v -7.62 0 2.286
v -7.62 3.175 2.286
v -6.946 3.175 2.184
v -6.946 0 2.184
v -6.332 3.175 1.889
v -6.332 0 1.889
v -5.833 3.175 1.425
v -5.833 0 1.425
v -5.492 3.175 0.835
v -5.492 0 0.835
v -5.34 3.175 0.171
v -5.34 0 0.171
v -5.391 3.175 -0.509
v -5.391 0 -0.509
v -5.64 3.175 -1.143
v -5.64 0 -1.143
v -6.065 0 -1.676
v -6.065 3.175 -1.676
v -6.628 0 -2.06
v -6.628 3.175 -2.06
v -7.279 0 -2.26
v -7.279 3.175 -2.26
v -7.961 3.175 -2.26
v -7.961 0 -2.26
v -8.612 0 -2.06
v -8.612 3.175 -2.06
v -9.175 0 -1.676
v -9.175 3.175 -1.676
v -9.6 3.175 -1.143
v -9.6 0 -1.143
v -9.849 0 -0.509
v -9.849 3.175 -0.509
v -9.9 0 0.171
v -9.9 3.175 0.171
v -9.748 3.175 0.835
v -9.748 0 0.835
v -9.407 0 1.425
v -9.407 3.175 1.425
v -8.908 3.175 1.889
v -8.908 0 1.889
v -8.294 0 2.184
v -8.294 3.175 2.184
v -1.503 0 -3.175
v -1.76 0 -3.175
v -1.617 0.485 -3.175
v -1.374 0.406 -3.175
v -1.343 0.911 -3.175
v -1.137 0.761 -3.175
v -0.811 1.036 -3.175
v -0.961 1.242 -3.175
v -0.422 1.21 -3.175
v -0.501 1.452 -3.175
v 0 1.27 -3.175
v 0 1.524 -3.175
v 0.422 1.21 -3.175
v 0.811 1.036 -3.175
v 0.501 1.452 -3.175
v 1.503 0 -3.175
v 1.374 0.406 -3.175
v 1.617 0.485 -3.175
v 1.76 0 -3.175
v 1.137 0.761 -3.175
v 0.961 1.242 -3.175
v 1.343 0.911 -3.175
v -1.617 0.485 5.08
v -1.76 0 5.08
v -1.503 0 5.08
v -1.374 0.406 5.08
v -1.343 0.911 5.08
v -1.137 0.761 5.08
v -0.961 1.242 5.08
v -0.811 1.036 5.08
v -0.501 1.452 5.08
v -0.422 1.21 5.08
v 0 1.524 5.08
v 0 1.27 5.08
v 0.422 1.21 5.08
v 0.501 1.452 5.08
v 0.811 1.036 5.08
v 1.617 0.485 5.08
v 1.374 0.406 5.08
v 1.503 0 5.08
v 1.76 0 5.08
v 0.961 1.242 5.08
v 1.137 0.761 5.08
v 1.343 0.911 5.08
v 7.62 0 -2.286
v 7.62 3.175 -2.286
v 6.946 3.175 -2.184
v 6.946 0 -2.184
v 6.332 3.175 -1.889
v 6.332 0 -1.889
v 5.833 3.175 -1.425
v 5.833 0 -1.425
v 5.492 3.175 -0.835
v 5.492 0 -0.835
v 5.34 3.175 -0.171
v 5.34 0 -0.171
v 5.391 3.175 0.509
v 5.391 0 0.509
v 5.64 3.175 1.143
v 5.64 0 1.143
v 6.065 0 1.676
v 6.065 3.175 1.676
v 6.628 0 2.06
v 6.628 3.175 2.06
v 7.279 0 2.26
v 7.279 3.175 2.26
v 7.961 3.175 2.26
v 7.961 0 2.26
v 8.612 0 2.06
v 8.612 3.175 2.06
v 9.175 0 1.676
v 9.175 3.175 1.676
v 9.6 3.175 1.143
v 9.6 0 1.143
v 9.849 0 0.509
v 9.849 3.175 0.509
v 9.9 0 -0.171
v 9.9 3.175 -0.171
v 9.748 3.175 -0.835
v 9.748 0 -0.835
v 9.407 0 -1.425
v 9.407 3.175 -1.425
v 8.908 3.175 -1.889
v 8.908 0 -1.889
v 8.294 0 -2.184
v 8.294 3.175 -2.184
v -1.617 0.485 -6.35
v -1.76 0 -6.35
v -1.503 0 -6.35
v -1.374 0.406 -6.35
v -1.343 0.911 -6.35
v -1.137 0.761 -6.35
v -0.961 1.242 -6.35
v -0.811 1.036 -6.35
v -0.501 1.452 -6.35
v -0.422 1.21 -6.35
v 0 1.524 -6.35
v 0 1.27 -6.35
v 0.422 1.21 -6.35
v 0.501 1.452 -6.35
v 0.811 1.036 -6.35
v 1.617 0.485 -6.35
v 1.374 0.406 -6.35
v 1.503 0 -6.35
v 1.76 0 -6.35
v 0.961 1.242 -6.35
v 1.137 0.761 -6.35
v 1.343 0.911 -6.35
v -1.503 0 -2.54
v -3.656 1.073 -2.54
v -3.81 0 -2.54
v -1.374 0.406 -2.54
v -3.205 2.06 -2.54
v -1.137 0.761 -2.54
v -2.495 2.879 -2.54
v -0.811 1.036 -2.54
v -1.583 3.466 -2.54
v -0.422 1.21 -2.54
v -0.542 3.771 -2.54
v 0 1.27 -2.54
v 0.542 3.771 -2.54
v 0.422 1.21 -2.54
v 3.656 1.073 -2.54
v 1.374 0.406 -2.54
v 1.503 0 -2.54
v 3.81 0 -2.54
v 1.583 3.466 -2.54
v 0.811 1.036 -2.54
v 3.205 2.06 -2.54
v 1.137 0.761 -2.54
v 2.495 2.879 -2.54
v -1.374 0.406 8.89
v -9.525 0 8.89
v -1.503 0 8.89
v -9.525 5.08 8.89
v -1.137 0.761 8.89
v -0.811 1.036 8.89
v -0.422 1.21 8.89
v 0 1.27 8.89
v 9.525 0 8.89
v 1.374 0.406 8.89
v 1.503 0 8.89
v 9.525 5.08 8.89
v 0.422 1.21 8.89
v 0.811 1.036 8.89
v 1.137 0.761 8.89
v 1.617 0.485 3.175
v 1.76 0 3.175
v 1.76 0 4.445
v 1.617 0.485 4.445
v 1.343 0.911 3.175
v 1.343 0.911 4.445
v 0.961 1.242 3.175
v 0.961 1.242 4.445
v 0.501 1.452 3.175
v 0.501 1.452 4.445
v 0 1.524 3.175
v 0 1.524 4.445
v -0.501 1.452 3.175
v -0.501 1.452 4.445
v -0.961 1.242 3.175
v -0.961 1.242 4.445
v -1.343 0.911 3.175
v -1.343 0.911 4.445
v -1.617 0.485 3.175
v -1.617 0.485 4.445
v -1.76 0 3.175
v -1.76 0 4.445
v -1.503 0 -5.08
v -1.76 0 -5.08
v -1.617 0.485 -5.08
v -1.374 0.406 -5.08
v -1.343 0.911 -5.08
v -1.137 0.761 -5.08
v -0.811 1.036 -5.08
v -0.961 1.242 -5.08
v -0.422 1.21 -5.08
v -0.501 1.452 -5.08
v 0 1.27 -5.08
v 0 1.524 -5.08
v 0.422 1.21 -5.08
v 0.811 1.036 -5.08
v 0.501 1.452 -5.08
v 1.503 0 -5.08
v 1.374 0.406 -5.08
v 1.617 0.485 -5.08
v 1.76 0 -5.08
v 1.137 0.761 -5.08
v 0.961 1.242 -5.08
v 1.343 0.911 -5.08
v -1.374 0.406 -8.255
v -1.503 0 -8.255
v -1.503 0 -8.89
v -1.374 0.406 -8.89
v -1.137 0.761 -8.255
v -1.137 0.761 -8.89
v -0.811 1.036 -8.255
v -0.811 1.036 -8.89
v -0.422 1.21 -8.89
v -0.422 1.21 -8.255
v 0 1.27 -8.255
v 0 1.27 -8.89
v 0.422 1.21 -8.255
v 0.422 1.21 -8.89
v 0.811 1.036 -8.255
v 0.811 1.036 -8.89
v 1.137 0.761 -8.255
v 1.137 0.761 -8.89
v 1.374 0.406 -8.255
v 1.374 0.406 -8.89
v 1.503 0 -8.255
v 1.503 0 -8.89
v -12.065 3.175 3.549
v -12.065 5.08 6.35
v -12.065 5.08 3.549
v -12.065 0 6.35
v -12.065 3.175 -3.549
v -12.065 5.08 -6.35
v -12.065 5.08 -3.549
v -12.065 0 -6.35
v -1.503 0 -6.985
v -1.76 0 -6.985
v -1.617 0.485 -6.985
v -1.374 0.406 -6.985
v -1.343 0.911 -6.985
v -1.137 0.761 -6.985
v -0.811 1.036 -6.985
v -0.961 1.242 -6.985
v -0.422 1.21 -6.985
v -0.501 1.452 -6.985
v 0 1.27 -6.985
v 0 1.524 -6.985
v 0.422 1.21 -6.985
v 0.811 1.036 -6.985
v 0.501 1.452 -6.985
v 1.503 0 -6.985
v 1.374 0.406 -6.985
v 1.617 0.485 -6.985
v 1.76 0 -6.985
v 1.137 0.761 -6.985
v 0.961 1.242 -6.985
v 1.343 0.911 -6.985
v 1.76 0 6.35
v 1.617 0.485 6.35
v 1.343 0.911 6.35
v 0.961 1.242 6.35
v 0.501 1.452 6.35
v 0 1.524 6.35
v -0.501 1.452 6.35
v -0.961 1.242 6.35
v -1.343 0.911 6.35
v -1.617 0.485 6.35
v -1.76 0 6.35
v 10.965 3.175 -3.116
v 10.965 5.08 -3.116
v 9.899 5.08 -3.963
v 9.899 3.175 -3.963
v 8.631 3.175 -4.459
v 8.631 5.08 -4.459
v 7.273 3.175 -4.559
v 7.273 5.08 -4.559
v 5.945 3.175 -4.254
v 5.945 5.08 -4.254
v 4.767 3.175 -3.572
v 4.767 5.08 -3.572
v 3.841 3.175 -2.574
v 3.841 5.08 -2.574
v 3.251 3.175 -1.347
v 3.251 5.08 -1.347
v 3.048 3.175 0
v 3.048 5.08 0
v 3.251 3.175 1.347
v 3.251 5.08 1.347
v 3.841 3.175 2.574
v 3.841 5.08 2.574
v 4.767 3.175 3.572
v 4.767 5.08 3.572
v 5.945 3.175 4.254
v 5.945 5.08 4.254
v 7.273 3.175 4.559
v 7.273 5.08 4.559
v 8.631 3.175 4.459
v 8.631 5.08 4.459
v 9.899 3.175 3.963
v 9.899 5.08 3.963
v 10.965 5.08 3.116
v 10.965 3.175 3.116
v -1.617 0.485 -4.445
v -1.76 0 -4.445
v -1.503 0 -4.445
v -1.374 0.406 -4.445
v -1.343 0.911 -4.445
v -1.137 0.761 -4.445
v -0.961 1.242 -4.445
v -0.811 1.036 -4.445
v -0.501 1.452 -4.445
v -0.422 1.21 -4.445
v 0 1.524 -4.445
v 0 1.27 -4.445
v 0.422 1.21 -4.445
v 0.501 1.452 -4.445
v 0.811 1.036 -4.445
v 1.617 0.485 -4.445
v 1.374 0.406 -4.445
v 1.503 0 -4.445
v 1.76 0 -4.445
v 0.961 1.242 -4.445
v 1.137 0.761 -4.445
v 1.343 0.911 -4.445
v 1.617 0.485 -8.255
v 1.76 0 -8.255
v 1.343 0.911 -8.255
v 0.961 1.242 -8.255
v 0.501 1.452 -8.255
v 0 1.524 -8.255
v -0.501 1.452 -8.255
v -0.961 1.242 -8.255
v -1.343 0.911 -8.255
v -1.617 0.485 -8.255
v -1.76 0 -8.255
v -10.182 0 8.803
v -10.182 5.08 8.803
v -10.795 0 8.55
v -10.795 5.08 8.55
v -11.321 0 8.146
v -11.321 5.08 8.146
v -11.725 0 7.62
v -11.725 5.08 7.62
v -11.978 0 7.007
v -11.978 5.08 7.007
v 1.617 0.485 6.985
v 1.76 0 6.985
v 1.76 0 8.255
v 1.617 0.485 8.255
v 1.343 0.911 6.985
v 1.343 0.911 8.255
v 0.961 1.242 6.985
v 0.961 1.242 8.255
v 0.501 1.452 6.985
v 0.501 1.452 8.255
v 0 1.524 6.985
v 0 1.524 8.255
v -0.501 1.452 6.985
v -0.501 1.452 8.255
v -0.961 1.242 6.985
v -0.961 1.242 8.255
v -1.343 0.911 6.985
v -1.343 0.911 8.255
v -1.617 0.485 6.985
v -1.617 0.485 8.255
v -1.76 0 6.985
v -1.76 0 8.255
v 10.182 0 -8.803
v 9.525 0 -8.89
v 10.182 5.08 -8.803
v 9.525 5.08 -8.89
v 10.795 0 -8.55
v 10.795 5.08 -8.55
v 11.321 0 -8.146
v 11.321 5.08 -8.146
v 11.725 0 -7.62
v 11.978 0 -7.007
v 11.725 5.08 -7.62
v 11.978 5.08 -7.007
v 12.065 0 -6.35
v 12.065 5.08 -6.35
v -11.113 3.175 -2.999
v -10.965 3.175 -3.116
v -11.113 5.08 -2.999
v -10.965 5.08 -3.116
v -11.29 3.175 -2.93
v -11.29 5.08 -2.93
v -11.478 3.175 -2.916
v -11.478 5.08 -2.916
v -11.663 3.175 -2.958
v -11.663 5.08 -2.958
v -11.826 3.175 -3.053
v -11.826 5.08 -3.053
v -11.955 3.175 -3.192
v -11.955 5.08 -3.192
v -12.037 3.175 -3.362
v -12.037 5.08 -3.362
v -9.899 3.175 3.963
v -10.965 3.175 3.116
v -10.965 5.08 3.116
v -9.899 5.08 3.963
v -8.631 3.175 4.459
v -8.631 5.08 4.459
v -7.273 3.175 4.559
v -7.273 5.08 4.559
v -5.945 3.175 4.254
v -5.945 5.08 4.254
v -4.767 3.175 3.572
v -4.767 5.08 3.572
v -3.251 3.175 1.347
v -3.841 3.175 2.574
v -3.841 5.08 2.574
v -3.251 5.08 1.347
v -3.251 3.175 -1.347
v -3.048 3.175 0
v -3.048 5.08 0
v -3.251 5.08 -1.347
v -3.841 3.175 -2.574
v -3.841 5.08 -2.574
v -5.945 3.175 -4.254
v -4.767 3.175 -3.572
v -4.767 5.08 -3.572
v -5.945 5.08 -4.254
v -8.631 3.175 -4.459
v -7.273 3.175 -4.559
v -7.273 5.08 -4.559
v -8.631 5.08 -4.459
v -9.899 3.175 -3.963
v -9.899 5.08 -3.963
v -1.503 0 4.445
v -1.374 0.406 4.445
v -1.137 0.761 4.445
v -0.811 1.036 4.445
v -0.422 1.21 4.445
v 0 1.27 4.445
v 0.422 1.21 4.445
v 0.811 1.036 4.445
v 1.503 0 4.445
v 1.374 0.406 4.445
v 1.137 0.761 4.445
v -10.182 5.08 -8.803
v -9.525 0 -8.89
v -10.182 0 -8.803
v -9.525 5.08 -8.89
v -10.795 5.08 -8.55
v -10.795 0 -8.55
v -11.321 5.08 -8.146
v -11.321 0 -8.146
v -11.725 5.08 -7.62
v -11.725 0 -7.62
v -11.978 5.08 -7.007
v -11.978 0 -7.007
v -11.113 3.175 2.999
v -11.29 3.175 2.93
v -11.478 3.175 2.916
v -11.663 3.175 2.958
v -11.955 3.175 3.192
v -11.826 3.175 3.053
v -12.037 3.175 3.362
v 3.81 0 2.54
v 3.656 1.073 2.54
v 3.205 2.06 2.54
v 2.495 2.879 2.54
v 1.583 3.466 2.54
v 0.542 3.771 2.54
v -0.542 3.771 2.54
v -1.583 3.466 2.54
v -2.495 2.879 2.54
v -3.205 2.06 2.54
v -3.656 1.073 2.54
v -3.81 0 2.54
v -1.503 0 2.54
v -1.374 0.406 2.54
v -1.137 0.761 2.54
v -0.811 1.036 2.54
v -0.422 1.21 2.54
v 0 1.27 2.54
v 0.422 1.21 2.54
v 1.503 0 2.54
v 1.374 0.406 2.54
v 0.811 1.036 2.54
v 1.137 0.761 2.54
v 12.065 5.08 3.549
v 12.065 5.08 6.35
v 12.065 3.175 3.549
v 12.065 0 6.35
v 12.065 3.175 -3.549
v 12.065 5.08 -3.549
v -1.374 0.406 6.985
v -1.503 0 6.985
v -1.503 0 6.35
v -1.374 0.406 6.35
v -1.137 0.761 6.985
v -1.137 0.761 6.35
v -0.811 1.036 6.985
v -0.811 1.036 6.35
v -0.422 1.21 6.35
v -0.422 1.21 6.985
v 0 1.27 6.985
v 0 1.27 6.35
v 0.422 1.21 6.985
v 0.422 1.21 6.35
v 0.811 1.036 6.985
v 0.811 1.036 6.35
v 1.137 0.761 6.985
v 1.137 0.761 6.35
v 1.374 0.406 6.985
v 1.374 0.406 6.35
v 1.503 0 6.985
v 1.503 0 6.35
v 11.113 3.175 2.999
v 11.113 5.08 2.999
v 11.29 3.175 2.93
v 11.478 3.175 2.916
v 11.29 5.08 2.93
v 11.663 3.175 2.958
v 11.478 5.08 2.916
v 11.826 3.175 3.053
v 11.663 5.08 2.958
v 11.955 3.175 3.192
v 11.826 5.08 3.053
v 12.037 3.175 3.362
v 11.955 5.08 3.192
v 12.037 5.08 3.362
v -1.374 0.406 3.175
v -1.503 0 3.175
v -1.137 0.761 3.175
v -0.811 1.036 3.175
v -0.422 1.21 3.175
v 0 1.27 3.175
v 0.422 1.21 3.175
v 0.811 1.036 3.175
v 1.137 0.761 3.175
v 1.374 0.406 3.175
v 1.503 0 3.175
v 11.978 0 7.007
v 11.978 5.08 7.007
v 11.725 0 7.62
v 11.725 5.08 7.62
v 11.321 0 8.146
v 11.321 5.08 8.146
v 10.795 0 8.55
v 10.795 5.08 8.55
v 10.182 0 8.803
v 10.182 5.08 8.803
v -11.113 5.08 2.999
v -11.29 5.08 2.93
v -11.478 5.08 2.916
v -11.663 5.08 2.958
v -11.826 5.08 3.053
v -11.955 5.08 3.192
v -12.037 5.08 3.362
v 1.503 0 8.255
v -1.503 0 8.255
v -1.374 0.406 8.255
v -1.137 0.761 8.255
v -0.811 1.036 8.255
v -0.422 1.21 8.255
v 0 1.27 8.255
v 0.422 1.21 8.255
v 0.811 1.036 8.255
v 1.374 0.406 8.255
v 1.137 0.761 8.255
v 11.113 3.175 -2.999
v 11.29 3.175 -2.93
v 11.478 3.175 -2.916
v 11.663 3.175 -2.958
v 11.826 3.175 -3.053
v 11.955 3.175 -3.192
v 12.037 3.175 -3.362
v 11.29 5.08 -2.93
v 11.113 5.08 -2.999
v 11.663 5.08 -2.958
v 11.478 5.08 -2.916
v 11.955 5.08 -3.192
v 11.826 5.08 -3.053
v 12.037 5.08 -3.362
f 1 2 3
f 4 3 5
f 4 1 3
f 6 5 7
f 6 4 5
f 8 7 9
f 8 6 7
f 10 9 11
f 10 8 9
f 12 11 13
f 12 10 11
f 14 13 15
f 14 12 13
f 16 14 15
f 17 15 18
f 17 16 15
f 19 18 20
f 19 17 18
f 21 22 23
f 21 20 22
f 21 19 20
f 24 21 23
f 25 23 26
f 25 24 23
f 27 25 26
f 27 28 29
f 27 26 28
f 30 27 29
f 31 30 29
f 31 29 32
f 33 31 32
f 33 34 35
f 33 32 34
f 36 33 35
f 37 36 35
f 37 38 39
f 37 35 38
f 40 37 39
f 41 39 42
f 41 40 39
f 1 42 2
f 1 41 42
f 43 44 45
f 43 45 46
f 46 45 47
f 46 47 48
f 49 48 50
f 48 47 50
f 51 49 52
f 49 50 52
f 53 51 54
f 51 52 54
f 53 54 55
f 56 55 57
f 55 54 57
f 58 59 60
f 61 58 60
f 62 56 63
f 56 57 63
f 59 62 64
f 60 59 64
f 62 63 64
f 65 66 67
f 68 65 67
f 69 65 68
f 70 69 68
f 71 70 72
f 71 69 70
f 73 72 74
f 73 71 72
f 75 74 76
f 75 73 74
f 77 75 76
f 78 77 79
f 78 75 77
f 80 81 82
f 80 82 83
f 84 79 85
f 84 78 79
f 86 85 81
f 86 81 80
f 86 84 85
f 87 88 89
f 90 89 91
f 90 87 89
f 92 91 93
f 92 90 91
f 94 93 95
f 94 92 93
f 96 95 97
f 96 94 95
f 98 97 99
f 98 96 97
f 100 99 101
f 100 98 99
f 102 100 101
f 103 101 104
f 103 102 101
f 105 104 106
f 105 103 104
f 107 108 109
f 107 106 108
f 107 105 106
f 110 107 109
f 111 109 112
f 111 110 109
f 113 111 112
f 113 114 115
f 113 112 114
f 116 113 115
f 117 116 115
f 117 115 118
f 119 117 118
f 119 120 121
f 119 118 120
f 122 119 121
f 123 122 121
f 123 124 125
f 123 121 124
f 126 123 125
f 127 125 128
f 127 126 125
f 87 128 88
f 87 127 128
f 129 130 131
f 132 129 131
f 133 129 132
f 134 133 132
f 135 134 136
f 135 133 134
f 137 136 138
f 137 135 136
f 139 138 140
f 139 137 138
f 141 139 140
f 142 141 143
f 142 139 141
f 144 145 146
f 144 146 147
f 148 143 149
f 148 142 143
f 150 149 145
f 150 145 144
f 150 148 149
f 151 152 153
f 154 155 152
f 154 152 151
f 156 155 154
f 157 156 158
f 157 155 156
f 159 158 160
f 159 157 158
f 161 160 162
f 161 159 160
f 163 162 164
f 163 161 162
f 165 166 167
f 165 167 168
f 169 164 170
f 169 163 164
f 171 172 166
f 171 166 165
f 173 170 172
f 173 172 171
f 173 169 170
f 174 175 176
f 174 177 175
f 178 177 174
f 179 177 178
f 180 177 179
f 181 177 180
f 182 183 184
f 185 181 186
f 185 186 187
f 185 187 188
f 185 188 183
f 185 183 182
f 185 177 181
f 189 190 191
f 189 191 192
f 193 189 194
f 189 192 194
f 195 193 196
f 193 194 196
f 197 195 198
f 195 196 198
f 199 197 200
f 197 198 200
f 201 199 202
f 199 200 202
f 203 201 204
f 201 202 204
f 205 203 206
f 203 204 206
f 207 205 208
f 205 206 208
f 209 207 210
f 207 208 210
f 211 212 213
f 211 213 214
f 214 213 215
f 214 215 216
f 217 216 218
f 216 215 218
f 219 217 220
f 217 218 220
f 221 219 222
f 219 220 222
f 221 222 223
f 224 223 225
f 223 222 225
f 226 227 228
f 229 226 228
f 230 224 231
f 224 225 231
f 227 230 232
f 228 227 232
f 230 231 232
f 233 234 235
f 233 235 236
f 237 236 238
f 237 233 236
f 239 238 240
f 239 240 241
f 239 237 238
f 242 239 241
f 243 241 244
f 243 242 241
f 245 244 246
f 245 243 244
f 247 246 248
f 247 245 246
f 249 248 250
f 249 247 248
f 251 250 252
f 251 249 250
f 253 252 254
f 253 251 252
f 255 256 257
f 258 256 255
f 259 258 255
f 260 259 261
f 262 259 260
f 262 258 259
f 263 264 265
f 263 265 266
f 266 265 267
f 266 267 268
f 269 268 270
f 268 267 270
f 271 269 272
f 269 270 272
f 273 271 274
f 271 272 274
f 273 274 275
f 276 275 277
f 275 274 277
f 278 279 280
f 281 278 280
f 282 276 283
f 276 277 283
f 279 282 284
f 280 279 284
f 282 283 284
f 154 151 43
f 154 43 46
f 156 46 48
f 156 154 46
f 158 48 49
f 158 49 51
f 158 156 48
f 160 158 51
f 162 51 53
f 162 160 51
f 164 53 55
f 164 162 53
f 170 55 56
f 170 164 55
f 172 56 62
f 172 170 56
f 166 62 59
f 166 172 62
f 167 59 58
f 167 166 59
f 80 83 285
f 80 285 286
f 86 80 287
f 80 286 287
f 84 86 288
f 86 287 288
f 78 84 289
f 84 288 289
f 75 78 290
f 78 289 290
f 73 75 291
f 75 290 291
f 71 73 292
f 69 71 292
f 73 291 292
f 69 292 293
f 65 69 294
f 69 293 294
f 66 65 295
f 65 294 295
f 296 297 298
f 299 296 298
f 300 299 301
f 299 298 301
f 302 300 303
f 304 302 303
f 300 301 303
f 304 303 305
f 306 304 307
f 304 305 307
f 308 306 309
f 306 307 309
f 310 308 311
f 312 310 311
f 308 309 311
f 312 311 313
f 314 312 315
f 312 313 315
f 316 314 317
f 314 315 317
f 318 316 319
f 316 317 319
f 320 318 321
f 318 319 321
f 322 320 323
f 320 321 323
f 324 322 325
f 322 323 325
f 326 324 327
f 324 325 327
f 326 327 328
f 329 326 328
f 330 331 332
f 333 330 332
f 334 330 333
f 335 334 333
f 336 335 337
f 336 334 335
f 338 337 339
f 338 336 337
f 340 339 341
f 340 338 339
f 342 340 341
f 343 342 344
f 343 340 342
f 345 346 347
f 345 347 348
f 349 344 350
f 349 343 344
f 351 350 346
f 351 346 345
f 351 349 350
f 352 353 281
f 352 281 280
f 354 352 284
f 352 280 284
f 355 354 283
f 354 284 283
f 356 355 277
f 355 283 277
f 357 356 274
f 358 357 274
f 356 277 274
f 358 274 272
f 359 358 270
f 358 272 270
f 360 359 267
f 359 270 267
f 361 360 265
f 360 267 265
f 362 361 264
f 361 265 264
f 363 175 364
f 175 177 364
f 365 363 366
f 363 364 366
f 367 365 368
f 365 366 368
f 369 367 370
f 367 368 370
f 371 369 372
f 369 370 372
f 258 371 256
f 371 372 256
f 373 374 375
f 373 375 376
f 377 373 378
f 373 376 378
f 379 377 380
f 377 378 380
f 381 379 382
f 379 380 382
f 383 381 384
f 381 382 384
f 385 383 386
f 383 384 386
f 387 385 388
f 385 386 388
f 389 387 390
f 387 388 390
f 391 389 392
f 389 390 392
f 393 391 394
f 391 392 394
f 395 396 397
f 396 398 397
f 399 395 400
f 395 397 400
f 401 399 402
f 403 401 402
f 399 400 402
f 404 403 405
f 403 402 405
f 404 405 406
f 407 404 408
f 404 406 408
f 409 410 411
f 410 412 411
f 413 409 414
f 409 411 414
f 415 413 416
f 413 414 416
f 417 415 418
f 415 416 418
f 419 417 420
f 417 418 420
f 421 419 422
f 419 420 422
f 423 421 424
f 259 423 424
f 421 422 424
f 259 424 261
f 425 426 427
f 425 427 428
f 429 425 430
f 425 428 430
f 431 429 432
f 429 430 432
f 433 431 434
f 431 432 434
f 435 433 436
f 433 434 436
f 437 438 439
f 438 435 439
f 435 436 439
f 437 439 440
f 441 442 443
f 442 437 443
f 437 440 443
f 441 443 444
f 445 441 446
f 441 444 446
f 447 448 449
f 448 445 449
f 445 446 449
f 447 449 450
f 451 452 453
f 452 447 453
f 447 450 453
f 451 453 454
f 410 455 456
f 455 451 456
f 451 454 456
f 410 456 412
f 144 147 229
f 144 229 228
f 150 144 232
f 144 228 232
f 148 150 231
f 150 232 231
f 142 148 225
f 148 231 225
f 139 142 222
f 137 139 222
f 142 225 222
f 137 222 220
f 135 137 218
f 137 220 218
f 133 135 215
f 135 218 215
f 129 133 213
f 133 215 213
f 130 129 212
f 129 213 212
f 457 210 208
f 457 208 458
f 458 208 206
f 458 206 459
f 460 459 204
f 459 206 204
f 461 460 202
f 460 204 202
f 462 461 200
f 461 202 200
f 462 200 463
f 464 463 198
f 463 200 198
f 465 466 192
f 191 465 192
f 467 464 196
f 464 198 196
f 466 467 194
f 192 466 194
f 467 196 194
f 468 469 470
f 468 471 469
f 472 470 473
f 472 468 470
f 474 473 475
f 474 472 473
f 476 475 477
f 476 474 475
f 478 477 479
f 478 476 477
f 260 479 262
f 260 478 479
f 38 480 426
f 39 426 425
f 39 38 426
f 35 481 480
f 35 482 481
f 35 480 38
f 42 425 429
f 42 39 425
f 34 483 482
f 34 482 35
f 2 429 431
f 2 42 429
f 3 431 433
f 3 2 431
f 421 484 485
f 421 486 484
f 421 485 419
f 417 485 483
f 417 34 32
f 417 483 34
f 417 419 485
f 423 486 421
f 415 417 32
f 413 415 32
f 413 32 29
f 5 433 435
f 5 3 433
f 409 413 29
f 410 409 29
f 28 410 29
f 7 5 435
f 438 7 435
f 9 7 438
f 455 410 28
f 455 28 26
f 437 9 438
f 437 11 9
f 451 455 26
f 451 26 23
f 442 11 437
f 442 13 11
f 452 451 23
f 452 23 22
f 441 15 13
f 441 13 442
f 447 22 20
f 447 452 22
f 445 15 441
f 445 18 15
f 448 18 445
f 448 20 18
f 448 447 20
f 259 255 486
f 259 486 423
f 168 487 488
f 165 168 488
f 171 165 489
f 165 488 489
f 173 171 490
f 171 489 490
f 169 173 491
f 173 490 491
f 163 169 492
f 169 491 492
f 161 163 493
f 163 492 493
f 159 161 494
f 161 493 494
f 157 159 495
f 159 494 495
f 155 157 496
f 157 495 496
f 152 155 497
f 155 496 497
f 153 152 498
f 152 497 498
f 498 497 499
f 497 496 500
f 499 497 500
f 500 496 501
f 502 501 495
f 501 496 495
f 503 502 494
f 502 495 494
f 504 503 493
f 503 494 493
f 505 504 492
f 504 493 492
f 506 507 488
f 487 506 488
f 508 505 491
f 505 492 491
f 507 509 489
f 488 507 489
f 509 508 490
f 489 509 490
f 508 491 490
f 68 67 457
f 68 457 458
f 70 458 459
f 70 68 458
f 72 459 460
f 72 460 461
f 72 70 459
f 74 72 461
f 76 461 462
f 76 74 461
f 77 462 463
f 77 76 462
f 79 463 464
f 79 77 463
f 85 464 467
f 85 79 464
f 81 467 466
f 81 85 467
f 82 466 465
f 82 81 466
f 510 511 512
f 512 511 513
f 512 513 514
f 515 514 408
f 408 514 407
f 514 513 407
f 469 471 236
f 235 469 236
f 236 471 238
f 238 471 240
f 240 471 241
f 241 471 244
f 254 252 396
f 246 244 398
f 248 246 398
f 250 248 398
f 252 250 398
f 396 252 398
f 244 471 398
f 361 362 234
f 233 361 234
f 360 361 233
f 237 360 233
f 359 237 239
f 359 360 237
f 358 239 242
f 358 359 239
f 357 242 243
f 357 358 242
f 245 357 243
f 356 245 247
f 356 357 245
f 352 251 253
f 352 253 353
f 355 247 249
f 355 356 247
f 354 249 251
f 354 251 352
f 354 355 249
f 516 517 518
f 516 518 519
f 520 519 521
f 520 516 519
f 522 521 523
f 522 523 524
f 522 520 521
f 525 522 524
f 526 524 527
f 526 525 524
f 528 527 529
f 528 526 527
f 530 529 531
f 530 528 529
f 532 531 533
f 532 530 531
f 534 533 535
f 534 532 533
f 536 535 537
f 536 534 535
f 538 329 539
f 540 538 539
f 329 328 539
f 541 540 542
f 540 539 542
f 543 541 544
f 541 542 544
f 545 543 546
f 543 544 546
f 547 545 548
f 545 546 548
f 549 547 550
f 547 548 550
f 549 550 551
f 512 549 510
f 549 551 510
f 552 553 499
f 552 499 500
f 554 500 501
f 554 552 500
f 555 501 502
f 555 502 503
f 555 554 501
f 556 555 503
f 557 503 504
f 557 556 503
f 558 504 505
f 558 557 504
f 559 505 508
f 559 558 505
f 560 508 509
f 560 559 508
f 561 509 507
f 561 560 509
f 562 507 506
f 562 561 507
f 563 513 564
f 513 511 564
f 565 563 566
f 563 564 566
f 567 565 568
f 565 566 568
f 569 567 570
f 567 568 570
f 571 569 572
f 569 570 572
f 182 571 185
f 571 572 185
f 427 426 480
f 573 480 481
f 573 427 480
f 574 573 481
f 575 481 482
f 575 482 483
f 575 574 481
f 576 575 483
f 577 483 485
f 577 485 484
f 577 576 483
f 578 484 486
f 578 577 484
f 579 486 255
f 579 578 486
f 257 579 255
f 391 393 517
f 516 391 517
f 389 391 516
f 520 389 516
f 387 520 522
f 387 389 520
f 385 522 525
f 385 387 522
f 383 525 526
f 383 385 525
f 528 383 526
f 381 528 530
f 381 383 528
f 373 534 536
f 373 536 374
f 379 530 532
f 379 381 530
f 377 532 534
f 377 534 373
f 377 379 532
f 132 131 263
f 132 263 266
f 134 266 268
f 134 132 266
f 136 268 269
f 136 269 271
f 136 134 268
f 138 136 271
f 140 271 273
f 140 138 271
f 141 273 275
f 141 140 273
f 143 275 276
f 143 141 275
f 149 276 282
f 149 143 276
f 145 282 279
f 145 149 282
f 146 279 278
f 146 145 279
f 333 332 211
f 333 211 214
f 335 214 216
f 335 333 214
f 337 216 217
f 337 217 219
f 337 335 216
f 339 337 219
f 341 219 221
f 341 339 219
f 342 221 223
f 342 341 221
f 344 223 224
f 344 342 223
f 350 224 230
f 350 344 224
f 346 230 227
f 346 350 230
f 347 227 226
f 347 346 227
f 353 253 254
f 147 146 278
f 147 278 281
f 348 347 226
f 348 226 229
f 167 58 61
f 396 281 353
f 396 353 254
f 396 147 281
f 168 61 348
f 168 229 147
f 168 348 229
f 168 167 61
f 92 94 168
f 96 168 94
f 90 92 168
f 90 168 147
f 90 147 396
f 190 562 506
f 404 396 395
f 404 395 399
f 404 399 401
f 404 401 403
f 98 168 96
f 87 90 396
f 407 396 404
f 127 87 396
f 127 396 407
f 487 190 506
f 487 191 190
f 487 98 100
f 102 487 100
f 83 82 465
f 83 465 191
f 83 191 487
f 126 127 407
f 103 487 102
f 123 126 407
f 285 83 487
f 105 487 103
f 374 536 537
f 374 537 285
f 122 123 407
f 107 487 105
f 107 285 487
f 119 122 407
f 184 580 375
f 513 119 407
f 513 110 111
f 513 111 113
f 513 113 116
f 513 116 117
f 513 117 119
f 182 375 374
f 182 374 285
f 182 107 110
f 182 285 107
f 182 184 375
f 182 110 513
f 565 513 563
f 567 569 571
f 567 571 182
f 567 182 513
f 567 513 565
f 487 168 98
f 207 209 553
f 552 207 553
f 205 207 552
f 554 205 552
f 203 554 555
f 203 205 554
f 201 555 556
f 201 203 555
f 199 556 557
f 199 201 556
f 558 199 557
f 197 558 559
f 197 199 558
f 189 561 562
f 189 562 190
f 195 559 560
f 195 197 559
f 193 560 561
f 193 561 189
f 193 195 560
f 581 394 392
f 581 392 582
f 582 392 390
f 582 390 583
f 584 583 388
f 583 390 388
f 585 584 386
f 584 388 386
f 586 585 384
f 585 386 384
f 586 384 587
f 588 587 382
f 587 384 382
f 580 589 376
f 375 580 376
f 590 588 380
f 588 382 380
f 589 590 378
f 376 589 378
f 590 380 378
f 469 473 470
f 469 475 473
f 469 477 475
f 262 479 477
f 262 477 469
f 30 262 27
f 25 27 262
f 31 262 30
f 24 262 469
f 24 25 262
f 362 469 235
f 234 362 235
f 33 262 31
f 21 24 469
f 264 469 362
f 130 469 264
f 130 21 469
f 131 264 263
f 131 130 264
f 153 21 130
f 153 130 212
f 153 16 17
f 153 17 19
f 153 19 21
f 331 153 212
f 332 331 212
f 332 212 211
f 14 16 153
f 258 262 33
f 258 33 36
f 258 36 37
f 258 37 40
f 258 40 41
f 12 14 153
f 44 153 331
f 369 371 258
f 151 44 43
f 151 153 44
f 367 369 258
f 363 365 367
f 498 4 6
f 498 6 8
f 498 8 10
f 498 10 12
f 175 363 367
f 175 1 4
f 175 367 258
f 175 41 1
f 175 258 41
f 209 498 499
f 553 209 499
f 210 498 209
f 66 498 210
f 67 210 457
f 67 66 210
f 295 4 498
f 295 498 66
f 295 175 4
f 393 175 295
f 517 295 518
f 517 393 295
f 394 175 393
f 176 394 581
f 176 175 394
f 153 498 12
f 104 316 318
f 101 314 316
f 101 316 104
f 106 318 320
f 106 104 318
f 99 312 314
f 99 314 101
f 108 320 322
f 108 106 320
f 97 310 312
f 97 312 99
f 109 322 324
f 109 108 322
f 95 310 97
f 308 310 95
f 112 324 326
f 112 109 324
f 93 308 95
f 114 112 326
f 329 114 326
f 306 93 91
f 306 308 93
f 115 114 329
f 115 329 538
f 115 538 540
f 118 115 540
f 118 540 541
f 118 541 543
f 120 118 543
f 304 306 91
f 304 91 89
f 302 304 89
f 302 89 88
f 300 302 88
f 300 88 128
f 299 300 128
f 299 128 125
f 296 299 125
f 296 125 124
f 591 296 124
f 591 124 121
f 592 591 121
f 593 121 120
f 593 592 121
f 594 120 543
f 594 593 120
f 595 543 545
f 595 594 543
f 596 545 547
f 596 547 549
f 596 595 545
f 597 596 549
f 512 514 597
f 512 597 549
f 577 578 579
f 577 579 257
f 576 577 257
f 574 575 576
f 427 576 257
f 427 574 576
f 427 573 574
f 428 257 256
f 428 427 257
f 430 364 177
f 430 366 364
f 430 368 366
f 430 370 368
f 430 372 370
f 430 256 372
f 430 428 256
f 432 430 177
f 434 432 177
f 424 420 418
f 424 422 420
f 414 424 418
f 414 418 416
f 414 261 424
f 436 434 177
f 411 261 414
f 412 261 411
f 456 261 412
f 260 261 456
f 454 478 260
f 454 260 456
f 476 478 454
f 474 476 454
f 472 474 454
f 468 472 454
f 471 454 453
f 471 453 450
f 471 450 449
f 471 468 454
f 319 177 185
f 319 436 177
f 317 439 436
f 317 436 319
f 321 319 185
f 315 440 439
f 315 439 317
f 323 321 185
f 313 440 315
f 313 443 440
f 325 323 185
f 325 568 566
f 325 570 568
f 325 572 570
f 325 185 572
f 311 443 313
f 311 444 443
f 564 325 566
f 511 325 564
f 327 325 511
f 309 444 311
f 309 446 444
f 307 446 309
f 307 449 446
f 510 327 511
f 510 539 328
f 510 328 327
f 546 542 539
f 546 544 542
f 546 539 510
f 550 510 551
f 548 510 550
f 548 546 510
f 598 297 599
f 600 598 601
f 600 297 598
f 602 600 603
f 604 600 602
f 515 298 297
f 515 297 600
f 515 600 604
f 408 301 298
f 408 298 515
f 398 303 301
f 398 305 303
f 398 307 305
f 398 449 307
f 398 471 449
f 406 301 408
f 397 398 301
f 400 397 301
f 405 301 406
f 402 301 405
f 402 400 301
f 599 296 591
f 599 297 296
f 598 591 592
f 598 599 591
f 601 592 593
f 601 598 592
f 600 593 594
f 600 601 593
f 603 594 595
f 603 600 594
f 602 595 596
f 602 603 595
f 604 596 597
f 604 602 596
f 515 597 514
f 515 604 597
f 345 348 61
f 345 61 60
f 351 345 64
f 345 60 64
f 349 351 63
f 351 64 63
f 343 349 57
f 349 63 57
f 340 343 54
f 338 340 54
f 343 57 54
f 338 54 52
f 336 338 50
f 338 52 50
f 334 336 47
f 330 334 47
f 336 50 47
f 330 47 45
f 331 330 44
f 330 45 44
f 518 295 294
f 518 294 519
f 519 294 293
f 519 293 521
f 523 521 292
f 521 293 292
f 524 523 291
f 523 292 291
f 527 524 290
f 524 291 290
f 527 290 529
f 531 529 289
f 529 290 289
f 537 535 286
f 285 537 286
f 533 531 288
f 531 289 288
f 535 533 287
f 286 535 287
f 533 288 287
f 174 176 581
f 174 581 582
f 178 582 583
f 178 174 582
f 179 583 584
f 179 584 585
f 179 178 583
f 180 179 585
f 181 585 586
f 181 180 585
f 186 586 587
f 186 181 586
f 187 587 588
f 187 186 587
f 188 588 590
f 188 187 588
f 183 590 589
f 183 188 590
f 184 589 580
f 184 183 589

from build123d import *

# Parameters (mm, degrees)
SKETCH1_W           = 24.13
SKETCH1_H           = 17.78
SKETCH1_R           = 2.286
BOSS_EXTRUDE1_DEPTH = 5.08
SKETCH2_R           = 1.778
CUT_EXTRUDE1_DEPTH  = 23.079380086
BOSS_EXTRUDE2_DEPTH = 0.635
LPATTERN1_COUNT     = 10
LPATTERN1_PITCH     = 1.905
SKETCH5_R           = 4.572
CUT_EXTRUDE2_DEPTH  = 1.905
FILLET1_R           = 0.635
FILLET2_R           = 2.54
SKETCH6_R           = 3.81
CUT_EXTRUDE3_DEPTH  = 2.54


with BuildPart() as part:
    # Sketch1 → Boss-Extrude1 (new body)
    with BuildSketch(Plane(origin=(0, 0, 0), x_dir=(1, 0, 0), z_dir=(0, 1, 0))):
        Rectangle(SKETCH1_W, SKETCH1_H)
        with Locations(Location((-7.62, 0, 0), (0, 0, 270))):
            Circle(SKETCH1_R, mode=Mode.SUBTRACT)
        with Locations(Location((7.62, 0, 0), (0, 0, 90))):
            Circle(SKETCH1_R, mode=Mode.SUBTRACT)
    extrude(amount=BOSS_EXTRUDE1_DEPTH)

    # Sketch2 → Cut-Extrude1 (cut, through all)
    with BuildSketch(Plane.XY.offset(8.89)):
        with Locations((0, -0.254)):
            Circle(SKETCH2_R)
    extrude(amount=-CUT_EXTRUDE1_DEPTH, mode=Mode.SUBTRACT)

    # Sketch4 → Boss-Extrude2 (add)
    with BuildSketch(Plane.XY.offset(8.89)):
        with BuildLine():
            ThreePointArc((1.75976362, 0), (0, 1.524), (-1.75976362, 0))
            Line((-1.75976362, 0), (-1.502684265, 0))
            ThreePointArc((-1.502684265, 0), (0, 1.27), (1.502684265, 0))
            Line((1.502684265, 0), (1.75976362, 0))
        make_face()
    boss_extrude2 = extrude(amount=-BOSS_EXTRUDE2_DEPTH)

    # LPattern1: Boss-Extrude2 ×10
    with Locations(*[(0, 0, -i * LPATTERN1_PITCH) for i in range(1, LPATTERN1_COUNT)]):
        add(boss_extrude2)

    # Sketch5 → Cut-Extrude2 (cut)
    with BuildSketch(Plane(origin=(0, 5.08, 0), x_dir=(1, 0, 0), z_dir=(0, 1, 0))):
        with Locations((-7.62, 0)):
            Circle(SKETCH5_R)
        with Locations((7.62, 0)):
            Circle(SKETCH5_R)
    extrude(amount=-CUT_EXTRUDE2_DEPTH, mode=Mode.SUBTRACT)

    # Fillet1
    fillet1_edges = [part.edges().sort_by_distance(p)[0] for p in [
        (12.065, 4.1275, -1.070121021),
        (12.065, 4.1275, 1.070121021),
        (-12.065, 4.1275, 1.070121021),
        (-12.065, 4.1275, -1.070121021),
    ]]
    fillet(fillet1_edges, radius=FILLET1_R)

    # Fillet2
    fillet2_edges = [part.edges().sort_by_distance(p)[0] for p in [
        (-12.065, 2.54, -8.89),
        (12.065, 2.54, -8.89),
        (12.065, 2.54, 8.89),
        (-12.065, 2.54, 8.89),
    ]]
    fillet(fillet2_edges, radius=FILLET2_R)

    # Sketch6 → Cut-Extrude3 (cut, symmetric)
    with BuildSketch(Plane.XY):
        Circle(SKETCH6_R)
    extrude(amount=CUT_EXTRUDE3_DEPTH, both=True, mode=Mode.SUBTRACT)


solid = part.part
